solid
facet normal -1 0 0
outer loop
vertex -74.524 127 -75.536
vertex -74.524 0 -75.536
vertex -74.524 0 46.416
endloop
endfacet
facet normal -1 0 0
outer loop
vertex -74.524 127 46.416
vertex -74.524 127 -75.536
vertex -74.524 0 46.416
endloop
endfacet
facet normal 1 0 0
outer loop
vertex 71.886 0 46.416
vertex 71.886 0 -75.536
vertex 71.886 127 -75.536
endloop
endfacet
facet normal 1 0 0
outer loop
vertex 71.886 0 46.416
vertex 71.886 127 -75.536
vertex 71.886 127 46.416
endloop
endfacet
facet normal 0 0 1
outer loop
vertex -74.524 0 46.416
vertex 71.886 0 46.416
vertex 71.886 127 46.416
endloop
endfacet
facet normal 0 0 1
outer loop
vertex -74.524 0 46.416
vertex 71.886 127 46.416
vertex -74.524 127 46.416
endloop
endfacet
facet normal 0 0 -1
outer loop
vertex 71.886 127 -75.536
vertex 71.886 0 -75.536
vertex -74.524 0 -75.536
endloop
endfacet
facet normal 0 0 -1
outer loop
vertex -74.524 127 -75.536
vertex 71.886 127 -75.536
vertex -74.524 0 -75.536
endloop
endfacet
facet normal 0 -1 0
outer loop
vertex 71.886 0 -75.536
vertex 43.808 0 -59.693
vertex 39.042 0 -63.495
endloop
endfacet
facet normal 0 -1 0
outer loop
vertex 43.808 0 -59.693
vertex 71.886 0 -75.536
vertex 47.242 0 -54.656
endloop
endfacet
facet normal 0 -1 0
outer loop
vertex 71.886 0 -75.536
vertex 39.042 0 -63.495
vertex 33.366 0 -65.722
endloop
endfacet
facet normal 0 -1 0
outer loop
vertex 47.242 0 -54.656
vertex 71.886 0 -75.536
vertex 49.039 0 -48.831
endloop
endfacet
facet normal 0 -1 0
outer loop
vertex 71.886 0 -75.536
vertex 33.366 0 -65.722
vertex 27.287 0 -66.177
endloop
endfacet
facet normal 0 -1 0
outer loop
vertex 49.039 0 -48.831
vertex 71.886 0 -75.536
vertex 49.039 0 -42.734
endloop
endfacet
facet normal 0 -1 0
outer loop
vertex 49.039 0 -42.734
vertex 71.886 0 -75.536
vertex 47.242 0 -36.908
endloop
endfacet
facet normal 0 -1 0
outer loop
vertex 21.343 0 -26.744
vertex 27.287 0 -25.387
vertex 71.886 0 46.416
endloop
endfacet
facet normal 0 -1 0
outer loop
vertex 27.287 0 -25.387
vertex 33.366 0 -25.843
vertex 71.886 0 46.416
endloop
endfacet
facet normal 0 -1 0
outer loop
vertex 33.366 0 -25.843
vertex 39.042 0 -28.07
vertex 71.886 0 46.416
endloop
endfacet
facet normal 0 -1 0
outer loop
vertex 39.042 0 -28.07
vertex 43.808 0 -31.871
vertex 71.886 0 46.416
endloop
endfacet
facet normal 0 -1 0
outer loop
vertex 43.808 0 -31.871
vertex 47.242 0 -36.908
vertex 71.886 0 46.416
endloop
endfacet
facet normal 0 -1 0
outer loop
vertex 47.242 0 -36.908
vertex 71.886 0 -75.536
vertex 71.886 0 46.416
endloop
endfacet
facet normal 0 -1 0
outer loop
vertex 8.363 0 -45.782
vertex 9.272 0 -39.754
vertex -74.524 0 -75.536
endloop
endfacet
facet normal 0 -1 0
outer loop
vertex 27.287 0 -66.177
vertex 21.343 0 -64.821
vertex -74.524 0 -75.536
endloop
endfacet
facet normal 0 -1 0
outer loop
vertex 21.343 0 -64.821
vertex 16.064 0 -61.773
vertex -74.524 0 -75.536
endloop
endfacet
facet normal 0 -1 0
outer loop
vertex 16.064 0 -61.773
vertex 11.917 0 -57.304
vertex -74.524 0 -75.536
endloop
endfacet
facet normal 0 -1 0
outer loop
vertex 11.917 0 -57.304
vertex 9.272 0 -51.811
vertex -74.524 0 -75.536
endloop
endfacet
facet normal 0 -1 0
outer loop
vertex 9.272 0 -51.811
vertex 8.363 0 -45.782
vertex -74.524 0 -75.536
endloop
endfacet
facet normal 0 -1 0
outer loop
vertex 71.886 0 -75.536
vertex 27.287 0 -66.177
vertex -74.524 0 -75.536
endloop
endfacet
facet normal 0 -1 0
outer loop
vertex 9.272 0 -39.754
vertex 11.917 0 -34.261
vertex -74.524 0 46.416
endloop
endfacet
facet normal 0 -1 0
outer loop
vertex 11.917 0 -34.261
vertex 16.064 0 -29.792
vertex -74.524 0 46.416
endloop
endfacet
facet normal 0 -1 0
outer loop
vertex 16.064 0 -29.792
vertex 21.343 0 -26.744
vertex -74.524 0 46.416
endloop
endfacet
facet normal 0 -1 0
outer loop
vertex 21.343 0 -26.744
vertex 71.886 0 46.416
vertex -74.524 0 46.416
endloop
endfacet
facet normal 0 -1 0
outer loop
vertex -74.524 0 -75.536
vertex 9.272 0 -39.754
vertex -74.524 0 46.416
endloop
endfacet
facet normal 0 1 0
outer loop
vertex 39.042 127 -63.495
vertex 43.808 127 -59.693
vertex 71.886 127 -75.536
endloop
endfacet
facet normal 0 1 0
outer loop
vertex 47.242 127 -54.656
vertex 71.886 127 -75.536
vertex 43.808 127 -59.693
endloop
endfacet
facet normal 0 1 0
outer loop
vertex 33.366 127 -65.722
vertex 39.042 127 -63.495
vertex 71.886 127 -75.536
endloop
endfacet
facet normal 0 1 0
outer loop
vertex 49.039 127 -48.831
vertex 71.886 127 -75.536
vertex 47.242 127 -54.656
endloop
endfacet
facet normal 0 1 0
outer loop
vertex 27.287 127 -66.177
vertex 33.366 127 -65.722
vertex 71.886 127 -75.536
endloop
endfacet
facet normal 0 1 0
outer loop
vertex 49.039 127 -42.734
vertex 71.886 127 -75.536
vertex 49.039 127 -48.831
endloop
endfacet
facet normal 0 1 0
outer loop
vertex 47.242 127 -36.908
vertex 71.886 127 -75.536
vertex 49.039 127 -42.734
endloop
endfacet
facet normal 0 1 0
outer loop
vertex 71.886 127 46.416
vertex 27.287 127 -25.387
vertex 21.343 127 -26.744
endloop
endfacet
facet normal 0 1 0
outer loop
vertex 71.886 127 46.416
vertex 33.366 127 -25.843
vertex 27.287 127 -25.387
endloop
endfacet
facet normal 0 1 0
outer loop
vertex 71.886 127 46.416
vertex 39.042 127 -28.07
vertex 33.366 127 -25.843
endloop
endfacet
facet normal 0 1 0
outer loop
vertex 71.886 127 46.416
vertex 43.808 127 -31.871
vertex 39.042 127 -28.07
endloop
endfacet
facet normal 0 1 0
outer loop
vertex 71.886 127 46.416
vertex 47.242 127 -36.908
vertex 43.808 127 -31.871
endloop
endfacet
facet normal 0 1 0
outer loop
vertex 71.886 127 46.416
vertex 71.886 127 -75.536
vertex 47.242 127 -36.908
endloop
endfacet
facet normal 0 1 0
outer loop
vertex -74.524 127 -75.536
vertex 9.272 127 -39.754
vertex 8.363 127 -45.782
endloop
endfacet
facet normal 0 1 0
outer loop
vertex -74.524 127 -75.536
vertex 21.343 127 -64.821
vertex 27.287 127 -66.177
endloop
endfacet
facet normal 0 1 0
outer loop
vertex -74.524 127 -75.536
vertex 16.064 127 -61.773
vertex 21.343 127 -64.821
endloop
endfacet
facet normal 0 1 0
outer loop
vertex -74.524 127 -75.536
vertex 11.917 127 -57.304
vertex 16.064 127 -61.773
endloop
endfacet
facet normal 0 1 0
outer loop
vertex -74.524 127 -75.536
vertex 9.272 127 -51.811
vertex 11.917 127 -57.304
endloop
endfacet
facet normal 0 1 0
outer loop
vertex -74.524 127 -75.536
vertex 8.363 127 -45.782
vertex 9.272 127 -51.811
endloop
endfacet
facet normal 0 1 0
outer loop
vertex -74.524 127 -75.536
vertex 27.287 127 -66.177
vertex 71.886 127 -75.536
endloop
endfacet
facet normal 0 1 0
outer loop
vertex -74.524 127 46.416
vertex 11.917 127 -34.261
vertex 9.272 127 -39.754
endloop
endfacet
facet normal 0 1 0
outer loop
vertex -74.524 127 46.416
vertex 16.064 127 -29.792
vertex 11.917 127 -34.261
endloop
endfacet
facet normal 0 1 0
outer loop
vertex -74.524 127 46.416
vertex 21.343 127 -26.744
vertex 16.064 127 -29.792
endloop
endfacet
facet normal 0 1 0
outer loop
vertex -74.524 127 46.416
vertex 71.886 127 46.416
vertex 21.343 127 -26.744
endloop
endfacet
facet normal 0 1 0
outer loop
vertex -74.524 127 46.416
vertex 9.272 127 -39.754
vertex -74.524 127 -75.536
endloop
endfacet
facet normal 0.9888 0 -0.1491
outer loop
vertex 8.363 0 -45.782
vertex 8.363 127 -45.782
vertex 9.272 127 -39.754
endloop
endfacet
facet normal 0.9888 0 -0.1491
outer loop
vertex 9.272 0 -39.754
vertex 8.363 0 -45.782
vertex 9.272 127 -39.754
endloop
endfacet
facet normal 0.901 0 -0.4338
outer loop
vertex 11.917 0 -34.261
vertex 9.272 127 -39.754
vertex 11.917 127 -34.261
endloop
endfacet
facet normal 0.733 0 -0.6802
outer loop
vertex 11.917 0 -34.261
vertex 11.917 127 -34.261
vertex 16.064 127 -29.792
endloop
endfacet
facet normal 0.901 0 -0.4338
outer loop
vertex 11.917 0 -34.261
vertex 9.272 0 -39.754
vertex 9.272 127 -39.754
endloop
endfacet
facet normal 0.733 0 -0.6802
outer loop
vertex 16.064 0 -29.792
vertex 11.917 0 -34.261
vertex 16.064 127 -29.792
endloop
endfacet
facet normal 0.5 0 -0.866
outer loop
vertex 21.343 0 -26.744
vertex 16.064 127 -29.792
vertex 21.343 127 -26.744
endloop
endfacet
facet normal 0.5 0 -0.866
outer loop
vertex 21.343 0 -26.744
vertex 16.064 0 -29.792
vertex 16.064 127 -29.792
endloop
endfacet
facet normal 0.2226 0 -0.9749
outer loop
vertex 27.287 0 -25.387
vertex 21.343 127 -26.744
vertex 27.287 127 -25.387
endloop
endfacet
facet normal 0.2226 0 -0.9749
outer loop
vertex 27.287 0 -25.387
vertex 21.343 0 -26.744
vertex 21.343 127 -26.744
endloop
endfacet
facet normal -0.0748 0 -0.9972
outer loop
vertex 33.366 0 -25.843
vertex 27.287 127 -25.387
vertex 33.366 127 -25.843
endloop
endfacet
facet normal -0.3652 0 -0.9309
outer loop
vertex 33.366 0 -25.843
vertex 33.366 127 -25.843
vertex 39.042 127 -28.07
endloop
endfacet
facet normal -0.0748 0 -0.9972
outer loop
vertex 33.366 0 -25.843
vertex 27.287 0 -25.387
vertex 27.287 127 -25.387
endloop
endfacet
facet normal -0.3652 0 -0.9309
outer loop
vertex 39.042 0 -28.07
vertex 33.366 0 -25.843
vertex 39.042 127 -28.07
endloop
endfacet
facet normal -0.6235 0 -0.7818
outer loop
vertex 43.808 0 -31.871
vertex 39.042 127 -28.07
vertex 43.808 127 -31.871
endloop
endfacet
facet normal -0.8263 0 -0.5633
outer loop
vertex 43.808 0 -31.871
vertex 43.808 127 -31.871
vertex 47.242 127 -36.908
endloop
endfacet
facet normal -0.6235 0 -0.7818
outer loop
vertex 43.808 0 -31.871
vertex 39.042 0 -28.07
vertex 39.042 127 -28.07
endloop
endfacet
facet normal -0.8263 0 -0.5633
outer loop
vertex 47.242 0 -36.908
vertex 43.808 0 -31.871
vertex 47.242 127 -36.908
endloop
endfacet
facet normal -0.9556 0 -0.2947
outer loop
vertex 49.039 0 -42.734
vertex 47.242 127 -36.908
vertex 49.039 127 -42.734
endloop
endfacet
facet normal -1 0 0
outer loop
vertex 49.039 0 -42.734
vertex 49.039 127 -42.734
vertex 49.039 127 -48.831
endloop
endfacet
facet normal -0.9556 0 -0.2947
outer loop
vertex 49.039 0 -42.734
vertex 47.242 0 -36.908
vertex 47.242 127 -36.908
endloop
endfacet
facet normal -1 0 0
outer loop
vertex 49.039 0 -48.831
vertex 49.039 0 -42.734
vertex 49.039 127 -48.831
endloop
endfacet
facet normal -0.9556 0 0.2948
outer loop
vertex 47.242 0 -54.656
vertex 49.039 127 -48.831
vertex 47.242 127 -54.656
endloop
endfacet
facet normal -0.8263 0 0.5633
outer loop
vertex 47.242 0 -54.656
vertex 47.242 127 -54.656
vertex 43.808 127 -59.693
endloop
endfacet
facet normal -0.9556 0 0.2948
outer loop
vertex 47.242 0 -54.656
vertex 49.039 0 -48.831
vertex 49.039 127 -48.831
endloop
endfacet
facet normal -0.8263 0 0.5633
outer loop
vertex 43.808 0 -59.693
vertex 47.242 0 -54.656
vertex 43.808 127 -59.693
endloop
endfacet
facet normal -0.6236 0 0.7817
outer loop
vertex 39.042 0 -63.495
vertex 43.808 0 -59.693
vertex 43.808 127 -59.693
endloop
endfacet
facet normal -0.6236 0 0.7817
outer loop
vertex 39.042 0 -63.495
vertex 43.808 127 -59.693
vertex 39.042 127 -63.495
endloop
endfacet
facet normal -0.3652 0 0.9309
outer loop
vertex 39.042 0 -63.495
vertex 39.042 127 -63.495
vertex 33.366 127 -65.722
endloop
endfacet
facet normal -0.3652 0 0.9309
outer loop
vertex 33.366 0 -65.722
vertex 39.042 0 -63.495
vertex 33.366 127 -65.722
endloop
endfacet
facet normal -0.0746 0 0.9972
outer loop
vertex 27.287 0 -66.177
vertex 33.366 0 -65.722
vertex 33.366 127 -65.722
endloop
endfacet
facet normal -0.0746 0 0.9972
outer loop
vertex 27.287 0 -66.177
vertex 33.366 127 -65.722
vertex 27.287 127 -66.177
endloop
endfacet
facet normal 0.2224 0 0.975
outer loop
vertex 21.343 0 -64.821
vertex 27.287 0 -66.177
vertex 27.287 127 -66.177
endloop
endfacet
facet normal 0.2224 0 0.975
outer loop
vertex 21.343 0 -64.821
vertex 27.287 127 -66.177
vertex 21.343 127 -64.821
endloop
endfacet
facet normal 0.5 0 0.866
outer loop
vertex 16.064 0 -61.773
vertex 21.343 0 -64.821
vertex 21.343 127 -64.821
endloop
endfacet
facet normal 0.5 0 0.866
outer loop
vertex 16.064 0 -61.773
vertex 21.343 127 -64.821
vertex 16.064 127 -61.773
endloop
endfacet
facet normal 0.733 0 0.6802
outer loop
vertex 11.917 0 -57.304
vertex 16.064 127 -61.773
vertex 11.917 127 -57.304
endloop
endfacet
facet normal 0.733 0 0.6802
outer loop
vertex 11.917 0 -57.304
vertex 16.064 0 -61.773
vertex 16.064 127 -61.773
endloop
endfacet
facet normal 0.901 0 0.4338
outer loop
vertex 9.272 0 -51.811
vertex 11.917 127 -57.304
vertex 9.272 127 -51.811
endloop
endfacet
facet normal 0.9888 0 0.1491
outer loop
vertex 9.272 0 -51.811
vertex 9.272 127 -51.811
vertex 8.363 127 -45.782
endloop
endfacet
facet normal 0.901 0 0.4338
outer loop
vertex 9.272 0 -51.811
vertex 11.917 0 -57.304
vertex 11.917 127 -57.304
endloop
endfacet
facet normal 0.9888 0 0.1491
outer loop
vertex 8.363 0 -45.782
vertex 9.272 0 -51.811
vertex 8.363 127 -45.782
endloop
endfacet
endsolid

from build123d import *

# Parameters (mm, degrees)
F0_W     = 146.409407258
F0_H     = 121.9511963427
F1_DEPTH = 127
F4_D     = 25.4
F2_W     = 146.409407258
F2_H     = 121.9511963427
F2_R     = 20.4523292797
F6_DEPTH = 127


with BuildPart() as f1:
    # F0 (on Front) → F1 (new body)
    with BuildSketch(Plane.XZ):
        with Locations((-1.3189986348, -14.5600493997)):
            Rectangle(F0_W, F0_H)
    extrude(amount=F1_DEPTH)

    # F4 (through all)
    with Locations(Plane(origin=(0, 0, 0), x_dir=(-1, 0, 0), z_dir=(0, 1, 0))):
        with Locations((-28.0630998313, -46.4930534363)):
            Hole(F4_D / 2)


with BuildPart() as f6:
    # F2 (on face) → F6 (new body)
    with BuildSketch(Plane(origin=(0, 0, 0), x_dir=(-1, 0, 0), z_dir=(0, 1, 0))):
        with Locations((1.3189986348, -14.5600493997)):
            Rectangle(F2_W, F2_H)
        with Locations((-28.8153458387, -45.7823053002)):
            Circle(F2_R, mode=Mode.SUBTRACT)
    extrude(amount=F6_DEPTH)


solid = f6.part
